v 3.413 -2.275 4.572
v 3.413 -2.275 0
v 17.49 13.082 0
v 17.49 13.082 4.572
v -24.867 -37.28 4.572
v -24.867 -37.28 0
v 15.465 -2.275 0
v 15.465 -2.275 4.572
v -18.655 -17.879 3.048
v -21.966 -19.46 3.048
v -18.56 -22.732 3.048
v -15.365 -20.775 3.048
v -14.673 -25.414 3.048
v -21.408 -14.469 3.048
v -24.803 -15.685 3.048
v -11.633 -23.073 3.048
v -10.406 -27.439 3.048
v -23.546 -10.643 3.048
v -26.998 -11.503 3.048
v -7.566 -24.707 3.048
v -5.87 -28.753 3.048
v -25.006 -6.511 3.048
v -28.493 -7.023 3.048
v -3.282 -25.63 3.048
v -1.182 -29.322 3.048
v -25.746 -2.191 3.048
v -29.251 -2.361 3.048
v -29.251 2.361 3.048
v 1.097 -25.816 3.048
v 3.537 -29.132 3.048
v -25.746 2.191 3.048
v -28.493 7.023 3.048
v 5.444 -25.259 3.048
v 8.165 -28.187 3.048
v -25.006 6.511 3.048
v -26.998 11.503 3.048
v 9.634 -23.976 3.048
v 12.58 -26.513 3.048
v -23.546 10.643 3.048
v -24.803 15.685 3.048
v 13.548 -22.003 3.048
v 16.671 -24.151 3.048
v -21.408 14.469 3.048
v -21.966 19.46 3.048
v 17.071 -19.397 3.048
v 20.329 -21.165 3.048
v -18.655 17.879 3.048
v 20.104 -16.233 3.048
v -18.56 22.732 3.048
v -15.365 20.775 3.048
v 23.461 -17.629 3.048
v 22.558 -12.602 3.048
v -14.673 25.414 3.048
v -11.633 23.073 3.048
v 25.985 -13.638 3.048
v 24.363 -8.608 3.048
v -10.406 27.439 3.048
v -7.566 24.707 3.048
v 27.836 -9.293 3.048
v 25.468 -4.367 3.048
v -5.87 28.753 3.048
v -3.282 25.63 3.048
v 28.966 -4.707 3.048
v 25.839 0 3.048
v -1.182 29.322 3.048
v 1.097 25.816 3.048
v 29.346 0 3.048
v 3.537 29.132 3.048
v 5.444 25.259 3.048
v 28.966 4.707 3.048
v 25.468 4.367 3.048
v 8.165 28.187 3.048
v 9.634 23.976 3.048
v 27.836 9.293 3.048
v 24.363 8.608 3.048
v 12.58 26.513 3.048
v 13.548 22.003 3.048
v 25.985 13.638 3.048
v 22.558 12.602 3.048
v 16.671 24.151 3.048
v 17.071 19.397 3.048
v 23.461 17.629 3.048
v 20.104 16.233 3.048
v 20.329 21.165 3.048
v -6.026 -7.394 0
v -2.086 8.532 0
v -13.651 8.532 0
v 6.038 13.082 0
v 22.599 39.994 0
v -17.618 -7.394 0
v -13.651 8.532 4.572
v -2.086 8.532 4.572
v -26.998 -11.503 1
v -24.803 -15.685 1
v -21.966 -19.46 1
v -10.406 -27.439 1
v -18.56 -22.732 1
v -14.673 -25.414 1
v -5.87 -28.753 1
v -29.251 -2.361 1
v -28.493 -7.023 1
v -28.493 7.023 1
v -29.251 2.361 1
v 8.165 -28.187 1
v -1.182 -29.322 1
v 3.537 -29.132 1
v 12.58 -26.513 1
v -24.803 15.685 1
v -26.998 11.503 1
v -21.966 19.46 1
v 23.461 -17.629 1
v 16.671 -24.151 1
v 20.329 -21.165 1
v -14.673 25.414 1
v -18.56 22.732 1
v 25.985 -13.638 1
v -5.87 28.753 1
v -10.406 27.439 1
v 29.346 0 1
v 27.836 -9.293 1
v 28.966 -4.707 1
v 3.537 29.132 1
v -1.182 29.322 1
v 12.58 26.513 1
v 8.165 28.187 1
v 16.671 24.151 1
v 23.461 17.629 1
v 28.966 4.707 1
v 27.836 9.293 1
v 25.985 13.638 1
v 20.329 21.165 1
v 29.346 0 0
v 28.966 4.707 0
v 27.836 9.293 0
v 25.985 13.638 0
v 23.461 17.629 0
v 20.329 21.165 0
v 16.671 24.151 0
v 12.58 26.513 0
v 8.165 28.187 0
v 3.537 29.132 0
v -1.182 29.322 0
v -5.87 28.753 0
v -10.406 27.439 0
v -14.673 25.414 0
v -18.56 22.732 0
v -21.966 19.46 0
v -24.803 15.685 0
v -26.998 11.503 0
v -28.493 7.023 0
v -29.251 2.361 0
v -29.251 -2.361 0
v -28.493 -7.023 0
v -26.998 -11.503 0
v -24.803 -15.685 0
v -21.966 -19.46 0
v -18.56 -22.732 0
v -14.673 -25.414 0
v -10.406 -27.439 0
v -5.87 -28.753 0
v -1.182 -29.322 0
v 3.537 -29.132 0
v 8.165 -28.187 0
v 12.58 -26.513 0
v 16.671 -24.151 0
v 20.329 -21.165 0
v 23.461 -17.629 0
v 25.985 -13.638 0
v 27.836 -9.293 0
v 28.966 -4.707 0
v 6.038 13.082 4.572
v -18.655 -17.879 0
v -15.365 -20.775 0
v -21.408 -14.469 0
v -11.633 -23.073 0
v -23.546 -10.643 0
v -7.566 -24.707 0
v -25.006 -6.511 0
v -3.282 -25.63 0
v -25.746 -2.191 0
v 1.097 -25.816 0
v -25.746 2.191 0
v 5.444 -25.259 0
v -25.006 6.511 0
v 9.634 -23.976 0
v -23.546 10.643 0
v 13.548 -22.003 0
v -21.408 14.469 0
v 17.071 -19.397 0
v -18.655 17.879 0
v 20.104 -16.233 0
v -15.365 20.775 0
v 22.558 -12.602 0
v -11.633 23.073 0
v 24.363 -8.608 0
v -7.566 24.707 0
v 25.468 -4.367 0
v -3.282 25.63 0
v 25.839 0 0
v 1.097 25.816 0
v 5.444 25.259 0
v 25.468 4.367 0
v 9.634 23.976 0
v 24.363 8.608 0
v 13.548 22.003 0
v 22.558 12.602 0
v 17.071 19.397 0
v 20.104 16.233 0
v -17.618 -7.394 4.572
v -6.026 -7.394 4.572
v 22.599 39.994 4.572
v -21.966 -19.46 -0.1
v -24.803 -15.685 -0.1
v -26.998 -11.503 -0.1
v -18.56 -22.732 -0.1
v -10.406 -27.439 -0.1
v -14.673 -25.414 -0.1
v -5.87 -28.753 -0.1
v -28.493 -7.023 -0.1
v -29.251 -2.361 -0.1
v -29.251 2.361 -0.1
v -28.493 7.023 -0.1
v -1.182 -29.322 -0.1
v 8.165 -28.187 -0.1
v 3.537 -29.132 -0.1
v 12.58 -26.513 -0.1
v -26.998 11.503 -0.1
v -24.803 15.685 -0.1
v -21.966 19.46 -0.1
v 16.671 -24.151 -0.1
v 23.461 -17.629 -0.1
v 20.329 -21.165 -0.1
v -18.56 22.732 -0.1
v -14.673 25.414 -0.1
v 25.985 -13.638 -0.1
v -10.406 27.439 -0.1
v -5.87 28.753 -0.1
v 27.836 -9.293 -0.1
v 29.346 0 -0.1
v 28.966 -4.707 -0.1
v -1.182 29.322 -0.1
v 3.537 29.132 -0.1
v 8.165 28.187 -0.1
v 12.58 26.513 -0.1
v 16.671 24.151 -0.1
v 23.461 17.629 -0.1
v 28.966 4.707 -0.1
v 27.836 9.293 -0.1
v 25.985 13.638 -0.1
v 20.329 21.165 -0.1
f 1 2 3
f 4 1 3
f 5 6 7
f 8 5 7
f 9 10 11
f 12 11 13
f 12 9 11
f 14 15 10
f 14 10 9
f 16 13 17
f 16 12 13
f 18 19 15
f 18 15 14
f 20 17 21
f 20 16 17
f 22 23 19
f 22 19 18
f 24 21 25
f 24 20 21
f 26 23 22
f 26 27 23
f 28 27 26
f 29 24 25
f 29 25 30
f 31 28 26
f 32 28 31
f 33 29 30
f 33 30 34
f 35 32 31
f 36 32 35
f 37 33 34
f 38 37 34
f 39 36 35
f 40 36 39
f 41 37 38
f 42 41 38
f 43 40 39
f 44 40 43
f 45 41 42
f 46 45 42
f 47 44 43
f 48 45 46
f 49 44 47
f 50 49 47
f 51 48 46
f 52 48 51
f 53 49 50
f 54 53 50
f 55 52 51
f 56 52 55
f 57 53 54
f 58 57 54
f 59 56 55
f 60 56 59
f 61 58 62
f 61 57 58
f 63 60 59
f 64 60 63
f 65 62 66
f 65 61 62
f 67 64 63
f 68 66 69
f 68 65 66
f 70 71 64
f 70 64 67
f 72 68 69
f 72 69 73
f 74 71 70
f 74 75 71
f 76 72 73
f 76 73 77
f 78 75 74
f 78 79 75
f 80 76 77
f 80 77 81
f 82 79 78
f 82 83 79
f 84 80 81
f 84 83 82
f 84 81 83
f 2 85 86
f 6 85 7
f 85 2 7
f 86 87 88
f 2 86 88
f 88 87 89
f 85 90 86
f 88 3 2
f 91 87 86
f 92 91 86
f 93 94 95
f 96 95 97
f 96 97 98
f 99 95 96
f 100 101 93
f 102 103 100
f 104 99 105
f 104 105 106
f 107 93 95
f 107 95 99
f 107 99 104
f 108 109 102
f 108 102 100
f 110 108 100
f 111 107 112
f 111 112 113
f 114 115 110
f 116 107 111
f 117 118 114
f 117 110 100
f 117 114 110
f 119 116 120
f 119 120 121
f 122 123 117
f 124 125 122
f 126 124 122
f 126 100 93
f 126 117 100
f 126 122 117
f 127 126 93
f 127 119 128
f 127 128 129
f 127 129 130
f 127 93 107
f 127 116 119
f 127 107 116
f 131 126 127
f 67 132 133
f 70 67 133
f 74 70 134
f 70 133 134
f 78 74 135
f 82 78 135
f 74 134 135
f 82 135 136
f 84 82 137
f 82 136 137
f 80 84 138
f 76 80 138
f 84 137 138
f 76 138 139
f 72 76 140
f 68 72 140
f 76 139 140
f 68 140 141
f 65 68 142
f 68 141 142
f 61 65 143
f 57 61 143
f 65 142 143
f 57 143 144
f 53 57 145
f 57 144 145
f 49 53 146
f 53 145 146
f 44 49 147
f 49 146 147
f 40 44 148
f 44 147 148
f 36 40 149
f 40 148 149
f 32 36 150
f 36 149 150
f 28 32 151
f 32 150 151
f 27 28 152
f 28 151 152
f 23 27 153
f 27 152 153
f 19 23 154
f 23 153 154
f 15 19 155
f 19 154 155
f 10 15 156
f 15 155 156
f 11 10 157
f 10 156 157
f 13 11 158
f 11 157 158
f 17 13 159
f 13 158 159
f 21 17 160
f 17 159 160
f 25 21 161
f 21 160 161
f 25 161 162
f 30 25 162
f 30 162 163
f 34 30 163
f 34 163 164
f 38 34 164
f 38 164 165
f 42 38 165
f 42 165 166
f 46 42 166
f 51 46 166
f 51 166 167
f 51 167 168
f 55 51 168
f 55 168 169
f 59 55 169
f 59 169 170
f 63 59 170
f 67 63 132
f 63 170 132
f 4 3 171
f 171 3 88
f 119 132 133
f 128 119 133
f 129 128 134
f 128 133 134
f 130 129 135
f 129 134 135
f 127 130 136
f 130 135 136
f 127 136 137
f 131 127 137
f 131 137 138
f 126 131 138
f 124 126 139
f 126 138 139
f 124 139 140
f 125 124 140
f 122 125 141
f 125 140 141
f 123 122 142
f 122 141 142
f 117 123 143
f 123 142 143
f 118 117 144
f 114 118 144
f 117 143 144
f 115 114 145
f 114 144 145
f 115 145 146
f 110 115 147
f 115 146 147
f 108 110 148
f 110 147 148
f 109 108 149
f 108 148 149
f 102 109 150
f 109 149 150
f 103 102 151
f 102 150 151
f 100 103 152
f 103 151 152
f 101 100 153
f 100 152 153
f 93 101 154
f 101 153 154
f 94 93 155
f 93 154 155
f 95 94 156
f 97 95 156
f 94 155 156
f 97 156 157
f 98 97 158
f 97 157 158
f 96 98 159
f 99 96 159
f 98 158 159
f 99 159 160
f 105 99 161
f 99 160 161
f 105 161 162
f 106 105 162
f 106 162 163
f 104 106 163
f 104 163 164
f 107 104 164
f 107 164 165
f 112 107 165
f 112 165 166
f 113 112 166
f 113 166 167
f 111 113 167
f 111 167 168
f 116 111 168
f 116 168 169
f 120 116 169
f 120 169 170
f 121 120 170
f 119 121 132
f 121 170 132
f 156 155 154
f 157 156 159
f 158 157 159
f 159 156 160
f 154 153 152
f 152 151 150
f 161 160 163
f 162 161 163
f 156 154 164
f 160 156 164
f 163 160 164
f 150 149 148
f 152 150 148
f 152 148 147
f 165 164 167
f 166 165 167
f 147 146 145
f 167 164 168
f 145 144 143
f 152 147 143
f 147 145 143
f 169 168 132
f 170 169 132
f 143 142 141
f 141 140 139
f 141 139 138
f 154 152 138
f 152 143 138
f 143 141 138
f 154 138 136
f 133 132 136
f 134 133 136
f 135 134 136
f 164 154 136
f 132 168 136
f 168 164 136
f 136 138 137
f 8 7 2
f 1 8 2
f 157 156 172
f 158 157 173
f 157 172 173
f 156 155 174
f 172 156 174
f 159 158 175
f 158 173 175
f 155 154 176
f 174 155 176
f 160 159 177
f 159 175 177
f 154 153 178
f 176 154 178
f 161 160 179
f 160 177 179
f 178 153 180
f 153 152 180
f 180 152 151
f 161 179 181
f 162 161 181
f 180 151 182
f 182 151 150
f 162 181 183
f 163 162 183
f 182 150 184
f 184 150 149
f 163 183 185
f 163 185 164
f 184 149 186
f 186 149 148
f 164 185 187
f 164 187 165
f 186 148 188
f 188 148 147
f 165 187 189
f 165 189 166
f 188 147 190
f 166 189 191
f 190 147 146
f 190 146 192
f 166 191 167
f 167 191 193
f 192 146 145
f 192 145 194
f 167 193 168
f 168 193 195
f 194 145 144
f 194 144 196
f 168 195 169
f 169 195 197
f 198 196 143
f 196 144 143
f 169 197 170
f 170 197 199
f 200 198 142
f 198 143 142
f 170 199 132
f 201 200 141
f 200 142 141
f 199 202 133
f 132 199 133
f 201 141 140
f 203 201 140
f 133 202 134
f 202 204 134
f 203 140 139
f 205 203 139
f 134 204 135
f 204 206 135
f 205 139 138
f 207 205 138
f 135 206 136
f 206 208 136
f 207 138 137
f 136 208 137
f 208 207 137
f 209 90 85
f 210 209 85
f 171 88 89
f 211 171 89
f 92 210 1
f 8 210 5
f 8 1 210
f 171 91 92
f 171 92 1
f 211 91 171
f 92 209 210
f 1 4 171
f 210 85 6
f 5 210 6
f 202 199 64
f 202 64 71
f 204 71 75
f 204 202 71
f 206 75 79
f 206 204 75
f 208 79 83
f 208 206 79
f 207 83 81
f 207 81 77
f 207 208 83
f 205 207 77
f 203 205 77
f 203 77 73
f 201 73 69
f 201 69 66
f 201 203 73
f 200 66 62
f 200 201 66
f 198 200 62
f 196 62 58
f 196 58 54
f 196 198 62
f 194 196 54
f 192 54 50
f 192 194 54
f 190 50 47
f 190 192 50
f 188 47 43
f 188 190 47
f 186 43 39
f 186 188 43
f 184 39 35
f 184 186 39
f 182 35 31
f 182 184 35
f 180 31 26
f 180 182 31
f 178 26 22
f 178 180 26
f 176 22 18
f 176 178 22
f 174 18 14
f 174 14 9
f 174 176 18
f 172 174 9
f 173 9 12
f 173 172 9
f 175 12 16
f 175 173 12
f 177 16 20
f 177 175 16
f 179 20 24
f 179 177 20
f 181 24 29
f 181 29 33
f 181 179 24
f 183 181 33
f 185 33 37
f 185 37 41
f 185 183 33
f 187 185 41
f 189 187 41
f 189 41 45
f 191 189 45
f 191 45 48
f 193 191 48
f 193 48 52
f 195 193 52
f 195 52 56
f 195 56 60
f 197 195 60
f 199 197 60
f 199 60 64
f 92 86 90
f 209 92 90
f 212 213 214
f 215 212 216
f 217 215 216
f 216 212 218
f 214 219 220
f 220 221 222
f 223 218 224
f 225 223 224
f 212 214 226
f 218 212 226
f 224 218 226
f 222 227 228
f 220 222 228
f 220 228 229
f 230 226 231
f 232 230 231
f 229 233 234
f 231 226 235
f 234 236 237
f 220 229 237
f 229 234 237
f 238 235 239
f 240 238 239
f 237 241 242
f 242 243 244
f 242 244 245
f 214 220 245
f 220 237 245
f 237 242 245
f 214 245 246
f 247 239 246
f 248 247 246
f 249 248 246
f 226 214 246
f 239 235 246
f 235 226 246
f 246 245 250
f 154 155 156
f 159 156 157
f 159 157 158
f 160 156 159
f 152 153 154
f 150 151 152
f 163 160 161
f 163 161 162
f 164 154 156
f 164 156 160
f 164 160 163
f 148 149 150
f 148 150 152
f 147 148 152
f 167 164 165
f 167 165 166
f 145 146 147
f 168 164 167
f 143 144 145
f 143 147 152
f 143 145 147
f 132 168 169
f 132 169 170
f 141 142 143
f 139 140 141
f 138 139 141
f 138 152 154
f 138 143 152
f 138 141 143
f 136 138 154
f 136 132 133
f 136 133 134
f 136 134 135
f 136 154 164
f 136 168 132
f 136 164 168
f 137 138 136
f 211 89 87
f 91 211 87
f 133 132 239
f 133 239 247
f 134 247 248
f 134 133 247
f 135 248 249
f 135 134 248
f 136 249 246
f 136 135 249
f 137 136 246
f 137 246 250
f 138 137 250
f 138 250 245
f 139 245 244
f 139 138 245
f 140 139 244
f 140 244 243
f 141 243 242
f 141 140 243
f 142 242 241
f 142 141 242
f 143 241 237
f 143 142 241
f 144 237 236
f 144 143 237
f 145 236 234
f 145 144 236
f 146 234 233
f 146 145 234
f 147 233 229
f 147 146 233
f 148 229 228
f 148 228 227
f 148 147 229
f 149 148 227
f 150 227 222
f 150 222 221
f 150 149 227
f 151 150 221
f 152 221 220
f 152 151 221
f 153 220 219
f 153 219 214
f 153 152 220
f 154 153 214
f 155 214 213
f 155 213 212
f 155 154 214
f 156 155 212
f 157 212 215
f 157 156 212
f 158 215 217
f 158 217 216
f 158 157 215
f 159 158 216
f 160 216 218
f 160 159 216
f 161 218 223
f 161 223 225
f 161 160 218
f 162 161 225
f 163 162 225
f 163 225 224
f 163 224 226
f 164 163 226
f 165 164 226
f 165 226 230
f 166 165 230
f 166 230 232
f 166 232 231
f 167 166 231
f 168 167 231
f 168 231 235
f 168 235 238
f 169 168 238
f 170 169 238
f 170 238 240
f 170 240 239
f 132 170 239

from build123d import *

# Parameters (mm, degrees)
F1_R     = 29.346135088
F1_R_2   = 25.8393981861
F5_DEPTH = 1
F6_DEPTH = 0.1
F7_DEPTH = 3.048
F8_DEPTH = 4.572


# Not quite as in the source:
# - the program builds the solid bodies; features that only make, move or delete a surface that nothing else refers to are left out


with BuildPart() as f5:
    # F1 (on face) → F5 (new body)
    with BuildSketch(Plane.XY):
        Circle(F1_R)
        Circle(F1_R_2, mode=Mode.SUBTRACT)
        Circle(F1_R_2)
    extrude(amount=F5_DEPTH)


with BuildPart() as f6:
    # F1 (on face) → F6 (new body)
    with BuildSketch(Plane.XY):
        Circle(F1_R)
        Circle(F1_R_2, mode=Mode.SUBTRACT)
        Circle(F1_R_2)
    extrude(amount=-F6_DEPTH)


with BuildPart() as f7:
    # F1 (on face) → F7 (new body)
    with BuildSketch(Plane.XY):
        Circle(F1_R)
        Circle(F1_R_2, mode=Mode.SUBTRACT)
    extrude(amount=F7_DEPTH)


with BuildPart() as f8:
    # F2 (on Top) → F8 (new body)
    with BuildSketch(Plane.XY):
        Polygon((6.0379398285, 13.0822043866), (22.5992734988, 39.9943725895), (-13.6509970043, 8.5318721831), (-2.0855690818, 8.5318721831), (-17.6184918681, -7.3942895979), (-6.025892119, -7.3942895979), (-24.8665944569, -37.2795380606), (15.4645281288, -2.2751658689), (3.412750084, -2.2751658689), (17.4903385899, 13.0822043866), align=None)
    extrude(amount=F8_DEPTH)


solid = Compound([f5.part, f6.part, f7.part, f8.part])
